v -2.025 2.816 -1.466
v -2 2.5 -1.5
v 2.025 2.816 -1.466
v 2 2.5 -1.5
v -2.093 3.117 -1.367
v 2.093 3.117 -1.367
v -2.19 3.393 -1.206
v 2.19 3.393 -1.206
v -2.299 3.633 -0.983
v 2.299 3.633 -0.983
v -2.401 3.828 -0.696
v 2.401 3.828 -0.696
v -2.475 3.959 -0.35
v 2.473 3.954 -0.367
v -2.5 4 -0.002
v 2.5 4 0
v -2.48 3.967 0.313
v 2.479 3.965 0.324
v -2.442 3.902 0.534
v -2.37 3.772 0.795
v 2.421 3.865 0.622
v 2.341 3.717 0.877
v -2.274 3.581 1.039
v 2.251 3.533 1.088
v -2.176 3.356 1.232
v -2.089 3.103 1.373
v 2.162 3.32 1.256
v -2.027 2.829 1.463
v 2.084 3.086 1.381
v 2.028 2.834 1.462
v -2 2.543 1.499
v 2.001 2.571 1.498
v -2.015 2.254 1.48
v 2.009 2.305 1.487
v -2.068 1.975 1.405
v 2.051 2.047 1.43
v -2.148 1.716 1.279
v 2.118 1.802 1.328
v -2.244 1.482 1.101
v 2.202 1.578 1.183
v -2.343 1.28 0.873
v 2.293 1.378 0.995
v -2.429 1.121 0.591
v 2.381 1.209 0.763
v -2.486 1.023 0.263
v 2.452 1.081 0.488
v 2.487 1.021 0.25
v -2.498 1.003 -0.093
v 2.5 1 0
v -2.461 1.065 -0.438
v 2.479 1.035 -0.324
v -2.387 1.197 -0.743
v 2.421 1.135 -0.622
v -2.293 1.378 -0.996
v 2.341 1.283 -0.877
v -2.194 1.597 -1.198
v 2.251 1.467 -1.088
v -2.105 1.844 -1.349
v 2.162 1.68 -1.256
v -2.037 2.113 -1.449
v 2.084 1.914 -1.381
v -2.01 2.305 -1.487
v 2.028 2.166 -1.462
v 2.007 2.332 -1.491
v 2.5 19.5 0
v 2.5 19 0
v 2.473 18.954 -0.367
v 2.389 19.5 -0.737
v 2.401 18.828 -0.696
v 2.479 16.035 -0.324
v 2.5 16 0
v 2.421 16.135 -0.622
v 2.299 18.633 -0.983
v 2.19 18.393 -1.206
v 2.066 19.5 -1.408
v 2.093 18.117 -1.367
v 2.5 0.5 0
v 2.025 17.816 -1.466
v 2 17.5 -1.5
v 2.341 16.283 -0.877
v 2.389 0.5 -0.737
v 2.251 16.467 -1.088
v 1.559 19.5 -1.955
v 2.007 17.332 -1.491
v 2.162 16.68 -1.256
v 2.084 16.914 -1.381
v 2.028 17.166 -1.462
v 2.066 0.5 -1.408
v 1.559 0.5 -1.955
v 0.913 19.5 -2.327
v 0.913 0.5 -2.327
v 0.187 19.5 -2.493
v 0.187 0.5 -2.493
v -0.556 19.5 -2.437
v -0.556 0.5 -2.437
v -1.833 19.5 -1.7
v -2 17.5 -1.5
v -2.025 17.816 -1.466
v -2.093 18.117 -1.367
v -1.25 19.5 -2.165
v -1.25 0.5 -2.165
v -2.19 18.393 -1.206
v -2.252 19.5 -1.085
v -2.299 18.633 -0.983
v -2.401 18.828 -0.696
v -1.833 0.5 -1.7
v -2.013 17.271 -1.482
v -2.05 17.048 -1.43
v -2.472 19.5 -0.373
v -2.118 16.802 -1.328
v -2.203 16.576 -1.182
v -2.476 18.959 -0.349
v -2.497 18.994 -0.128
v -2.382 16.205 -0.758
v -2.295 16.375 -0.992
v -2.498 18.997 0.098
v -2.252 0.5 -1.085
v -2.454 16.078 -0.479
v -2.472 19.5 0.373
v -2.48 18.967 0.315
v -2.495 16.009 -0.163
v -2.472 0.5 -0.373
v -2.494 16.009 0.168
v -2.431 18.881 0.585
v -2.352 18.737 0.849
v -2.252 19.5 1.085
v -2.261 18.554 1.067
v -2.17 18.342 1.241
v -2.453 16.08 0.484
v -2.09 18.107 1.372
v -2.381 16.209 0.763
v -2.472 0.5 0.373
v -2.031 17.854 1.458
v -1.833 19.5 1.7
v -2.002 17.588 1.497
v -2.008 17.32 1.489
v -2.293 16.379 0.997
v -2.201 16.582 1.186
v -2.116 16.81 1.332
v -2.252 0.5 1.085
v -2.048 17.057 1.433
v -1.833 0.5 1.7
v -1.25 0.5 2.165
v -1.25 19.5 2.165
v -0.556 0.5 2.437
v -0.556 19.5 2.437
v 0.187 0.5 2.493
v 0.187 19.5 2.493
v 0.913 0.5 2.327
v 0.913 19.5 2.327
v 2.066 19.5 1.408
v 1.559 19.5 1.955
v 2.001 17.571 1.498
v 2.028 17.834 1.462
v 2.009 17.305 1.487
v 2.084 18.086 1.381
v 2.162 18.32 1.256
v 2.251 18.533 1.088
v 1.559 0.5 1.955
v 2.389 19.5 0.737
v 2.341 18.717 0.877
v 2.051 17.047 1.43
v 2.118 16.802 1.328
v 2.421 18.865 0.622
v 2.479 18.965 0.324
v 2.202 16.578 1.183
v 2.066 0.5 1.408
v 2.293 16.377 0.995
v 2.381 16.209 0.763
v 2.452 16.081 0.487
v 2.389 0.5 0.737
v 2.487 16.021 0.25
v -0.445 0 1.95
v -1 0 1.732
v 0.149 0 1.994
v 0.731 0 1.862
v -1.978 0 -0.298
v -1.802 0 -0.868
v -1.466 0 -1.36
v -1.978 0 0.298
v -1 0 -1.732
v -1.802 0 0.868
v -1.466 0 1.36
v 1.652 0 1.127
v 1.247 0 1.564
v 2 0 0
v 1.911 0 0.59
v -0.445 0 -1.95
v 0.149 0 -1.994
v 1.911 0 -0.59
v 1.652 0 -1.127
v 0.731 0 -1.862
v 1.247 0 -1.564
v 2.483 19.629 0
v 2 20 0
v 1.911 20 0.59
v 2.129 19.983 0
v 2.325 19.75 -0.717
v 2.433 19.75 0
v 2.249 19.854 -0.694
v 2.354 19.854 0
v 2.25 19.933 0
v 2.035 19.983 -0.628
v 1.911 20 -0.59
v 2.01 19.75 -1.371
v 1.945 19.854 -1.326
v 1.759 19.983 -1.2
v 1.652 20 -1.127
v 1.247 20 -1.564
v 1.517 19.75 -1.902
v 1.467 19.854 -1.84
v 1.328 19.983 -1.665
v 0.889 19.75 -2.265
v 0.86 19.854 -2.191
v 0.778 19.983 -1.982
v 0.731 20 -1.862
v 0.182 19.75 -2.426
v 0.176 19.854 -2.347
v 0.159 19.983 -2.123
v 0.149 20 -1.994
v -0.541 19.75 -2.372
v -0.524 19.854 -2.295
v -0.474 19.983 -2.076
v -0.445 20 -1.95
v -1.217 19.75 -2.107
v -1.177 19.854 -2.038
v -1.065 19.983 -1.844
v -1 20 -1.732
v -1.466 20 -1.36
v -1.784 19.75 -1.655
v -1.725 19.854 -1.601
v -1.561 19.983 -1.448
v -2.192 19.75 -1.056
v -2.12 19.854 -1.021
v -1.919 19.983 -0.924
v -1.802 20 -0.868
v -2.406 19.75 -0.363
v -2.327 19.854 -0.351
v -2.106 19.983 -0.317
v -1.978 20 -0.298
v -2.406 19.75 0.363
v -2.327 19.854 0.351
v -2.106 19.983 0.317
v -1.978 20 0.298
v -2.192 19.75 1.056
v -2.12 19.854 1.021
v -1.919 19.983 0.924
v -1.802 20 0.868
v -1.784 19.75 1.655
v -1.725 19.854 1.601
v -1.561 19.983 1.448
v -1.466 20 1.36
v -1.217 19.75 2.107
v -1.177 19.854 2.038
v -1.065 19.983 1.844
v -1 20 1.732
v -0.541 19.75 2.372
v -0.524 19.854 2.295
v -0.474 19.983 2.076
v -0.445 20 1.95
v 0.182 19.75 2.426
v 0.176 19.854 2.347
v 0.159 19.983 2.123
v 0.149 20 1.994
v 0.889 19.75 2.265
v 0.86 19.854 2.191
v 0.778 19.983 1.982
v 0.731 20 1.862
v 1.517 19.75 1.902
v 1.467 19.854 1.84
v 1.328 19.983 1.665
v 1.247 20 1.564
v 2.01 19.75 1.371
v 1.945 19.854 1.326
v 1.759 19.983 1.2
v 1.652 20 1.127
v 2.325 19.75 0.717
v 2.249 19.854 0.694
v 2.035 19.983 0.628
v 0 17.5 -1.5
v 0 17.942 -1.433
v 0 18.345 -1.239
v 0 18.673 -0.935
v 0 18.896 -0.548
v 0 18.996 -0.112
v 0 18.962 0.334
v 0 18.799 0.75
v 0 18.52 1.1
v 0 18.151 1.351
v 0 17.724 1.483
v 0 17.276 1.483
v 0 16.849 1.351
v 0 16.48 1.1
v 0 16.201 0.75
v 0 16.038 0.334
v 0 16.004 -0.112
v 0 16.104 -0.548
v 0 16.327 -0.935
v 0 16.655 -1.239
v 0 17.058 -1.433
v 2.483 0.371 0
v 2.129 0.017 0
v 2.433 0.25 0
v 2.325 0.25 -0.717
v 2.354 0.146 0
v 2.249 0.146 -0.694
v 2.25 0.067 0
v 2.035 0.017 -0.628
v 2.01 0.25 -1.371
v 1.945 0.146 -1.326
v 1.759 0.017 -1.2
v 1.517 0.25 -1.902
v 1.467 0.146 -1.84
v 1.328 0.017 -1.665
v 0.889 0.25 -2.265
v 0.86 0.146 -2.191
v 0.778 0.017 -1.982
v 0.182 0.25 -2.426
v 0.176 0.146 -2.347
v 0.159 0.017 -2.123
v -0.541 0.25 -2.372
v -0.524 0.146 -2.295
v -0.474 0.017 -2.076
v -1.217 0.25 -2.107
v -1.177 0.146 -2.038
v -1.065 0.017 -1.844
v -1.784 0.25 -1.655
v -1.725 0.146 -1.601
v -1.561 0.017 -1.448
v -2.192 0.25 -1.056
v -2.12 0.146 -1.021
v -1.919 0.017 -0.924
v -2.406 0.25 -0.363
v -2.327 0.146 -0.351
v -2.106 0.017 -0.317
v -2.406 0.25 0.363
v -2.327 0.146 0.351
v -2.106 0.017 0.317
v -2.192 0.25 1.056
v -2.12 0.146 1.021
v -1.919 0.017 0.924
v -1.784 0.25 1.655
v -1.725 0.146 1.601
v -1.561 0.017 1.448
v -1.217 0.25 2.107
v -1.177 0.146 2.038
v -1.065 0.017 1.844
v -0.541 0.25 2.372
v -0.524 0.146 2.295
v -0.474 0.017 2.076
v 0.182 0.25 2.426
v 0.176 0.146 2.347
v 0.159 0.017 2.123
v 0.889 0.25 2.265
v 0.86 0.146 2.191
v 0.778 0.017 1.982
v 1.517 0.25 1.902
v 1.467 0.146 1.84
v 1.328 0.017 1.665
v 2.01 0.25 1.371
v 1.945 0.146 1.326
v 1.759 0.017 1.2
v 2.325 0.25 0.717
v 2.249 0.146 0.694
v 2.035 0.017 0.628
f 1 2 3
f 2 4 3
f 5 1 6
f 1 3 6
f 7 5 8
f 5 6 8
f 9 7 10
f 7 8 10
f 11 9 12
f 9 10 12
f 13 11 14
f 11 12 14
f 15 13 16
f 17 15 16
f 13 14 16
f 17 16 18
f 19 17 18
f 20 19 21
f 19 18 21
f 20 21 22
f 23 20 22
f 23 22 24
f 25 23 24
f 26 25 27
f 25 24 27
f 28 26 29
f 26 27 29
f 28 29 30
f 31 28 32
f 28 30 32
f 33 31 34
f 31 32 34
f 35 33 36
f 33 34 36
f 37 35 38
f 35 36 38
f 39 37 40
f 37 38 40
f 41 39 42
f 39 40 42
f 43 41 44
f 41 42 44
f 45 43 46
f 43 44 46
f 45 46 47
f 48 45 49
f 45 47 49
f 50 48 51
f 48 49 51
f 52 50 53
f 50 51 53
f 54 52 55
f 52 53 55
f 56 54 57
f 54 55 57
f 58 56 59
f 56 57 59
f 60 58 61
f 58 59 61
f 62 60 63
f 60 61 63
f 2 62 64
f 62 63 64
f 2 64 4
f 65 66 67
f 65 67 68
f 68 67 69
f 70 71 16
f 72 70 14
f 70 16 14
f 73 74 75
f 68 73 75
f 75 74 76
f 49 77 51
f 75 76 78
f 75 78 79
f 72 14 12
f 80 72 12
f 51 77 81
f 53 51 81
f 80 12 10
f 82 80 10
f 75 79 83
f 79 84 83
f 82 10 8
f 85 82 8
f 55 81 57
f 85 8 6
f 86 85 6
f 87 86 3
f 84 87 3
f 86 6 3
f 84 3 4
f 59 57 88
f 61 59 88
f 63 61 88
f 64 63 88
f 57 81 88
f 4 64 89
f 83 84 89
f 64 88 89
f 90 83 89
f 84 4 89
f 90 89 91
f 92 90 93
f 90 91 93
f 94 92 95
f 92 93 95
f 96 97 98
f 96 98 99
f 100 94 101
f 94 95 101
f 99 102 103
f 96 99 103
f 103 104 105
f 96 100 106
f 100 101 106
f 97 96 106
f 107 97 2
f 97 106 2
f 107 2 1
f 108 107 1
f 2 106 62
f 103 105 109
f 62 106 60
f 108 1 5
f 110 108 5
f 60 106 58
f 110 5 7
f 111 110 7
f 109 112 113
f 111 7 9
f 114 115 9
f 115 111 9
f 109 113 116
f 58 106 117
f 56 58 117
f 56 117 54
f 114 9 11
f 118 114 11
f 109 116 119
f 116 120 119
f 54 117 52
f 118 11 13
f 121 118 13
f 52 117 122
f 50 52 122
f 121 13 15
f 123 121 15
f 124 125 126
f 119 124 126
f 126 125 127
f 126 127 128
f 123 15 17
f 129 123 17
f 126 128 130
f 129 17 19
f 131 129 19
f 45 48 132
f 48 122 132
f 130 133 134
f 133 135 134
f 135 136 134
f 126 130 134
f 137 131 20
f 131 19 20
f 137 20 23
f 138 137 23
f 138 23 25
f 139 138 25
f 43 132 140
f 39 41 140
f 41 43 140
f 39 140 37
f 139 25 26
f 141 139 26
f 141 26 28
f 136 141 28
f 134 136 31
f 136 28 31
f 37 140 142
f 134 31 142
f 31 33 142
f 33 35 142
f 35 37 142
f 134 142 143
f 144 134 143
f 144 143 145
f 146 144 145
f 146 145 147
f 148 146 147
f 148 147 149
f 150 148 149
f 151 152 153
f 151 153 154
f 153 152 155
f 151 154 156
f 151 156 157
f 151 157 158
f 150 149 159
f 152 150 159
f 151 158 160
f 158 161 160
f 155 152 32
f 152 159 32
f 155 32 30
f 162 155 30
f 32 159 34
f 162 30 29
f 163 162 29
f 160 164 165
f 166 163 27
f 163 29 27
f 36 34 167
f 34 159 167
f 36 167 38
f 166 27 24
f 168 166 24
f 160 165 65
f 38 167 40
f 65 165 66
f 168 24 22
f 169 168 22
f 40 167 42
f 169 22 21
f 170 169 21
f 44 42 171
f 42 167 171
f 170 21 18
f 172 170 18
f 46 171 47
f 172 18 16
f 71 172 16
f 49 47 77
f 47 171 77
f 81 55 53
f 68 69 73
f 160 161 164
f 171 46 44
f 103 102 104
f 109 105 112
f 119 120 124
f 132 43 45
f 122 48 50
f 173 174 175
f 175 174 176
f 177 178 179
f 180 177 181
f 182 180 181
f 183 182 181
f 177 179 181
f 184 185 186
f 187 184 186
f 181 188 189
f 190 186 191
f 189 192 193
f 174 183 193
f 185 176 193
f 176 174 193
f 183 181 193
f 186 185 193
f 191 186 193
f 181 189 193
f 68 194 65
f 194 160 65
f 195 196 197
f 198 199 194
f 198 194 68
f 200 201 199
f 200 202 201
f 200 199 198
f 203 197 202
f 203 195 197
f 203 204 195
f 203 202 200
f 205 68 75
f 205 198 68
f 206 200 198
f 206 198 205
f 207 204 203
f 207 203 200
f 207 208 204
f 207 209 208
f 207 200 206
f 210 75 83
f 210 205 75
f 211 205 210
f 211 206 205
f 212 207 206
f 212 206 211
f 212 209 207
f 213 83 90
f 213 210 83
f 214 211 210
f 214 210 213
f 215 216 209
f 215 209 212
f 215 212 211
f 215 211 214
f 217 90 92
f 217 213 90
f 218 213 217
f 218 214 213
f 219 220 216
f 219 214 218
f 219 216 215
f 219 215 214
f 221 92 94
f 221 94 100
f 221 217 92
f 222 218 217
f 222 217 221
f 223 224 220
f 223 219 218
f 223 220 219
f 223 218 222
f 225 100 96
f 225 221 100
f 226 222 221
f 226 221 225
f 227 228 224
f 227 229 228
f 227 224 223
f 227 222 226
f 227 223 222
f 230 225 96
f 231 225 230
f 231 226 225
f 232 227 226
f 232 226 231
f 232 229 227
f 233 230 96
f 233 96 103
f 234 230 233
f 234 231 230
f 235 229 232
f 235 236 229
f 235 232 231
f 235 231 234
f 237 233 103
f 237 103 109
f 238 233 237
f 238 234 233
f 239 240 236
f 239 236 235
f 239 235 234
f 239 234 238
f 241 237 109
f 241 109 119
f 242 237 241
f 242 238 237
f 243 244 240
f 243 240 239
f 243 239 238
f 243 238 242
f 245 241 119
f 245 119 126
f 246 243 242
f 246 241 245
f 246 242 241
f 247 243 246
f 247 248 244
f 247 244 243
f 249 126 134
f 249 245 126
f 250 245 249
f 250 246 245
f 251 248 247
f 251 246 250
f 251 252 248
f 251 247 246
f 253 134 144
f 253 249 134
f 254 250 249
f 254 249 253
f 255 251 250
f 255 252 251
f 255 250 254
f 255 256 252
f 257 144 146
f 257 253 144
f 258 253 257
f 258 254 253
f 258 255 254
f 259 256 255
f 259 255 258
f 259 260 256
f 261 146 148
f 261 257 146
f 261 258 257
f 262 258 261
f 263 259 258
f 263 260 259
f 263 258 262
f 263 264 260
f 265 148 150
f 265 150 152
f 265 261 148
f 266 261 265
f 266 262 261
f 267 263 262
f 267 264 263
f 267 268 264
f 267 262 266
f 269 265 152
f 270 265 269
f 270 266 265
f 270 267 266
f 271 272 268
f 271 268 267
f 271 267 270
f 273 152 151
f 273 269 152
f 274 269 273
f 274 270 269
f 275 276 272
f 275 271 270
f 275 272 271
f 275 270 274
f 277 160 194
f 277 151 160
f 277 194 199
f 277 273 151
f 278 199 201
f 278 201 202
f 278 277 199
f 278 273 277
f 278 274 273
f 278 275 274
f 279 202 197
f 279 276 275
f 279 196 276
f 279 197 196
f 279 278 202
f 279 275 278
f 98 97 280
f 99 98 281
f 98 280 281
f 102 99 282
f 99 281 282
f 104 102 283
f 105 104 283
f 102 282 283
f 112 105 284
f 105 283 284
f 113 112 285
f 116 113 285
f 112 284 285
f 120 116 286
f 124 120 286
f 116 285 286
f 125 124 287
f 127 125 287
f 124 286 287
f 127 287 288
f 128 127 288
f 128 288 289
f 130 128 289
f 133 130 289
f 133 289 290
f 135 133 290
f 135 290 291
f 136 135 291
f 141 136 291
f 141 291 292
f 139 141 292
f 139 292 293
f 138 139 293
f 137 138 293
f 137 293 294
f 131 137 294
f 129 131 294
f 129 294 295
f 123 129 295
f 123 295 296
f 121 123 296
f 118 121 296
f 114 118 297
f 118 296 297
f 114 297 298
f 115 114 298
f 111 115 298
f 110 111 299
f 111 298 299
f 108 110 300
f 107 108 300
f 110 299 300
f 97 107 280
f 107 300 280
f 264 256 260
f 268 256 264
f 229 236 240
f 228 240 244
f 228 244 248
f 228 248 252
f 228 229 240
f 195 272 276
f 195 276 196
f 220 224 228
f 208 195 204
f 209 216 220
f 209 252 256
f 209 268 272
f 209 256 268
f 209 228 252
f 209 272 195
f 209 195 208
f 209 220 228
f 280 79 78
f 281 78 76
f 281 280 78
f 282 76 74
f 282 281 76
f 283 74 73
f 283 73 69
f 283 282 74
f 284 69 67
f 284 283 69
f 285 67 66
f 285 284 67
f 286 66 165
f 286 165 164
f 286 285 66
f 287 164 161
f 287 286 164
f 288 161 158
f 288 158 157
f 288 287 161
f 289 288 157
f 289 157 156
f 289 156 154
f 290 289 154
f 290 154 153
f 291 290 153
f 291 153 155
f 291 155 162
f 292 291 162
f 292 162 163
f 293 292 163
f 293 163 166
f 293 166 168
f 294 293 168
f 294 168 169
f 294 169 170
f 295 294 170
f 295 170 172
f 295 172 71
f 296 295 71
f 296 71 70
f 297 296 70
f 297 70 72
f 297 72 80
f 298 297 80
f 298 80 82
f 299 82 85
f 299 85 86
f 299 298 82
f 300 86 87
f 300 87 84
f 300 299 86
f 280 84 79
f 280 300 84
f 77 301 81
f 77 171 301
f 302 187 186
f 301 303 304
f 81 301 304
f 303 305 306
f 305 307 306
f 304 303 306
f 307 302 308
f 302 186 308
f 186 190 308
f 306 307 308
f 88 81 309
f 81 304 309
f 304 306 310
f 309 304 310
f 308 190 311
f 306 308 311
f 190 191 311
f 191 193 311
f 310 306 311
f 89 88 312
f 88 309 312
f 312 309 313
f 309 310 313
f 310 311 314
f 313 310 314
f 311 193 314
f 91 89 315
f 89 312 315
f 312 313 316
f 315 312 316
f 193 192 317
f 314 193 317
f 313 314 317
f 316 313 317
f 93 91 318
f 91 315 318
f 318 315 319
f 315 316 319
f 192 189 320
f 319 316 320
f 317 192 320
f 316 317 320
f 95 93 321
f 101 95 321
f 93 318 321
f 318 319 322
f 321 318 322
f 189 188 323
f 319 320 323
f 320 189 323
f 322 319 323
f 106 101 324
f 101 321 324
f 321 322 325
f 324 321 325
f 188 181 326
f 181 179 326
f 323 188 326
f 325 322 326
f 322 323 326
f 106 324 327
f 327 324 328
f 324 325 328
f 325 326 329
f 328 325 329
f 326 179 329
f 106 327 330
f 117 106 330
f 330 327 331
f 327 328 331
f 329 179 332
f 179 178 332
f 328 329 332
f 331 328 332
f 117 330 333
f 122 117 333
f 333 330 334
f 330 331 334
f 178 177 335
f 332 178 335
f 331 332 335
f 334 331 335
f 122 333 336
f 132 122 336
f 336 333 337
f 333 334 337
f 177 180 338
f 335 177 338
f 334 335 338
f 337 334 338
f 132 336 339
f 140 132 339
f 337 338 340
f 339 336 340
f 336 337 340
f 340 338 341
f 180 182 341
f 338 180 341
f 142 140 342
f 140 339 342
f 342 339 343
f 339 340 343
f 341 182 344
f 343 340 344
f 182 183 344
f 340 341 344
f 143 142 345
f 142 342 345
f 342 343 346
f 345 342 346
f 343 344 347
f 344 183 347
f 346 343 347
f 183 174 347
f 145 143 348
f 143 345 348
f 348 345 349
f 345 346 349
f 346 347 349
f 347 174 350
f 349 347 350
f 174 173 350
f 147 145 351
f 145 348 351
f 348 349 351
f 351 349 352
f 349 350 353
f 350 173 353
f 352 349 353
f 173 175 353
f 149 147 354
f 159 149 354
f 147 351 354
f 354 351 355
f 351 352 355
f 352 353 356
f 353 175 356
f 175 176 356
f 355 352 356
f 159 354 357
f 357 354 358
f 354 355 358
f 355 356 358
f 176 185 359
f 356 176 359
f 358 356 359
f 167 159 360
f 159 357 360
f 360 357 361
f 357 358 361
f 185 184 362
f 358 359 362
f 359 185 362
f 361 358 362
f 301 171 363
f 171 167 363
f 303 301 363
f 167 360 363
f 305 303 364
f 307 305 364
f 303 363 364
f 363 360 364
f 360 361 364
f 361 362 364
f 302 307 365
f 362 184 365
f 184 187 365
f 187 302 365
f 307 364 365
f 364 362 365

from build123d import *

# Parameters (mm, degrees)
SKETCH1_R           = 2.5
BOSS_EXTRUDE1_DEPTH = 20
SKETCH2_R           = 1.5
CUT_EXTRUDE1_DEPTH  = 5
FILLET1_R           = 0.5


with BuildPart() as part:
    # Sketch1 → Boss-Extrude1 (new body)
    with BuildSketch(Plane(origin=(0, 0, 0), x_dir=(1, 0, 0), z_dir=(0, 1, 0))):
        Circle(SKETCH1_R)
    extrude(amount=BOSS_EXTRUDE1_DEPTH)

    # Sketch2 → Cut-Extrude1 (cut, symmetric)
    with BuildSketch(Plane(origin=(0, 0, 0), x_dir=(0, 0, -1), z_dir=(1, 0, 0))):
        with Locations((0, 17.5)):
            Circle(SKETCH2_R)
        with Locations((0, 2.5)):
            Circle(SKETCH2_R)
    extrude(amount=CUT_EXTRUDE1_DEPTH, both=True, mode=Mode.SUBTRACT)

    # Fillet1
    fillet1_edges = [part.edges().sort_by_distance(p)[0] for p in [
        (-2.5, 0, 0),
        (-2.5, 20, 0),
    ]]
    fillet(fillet1_edges, radius=FILLET1_R)


solid = part.part
